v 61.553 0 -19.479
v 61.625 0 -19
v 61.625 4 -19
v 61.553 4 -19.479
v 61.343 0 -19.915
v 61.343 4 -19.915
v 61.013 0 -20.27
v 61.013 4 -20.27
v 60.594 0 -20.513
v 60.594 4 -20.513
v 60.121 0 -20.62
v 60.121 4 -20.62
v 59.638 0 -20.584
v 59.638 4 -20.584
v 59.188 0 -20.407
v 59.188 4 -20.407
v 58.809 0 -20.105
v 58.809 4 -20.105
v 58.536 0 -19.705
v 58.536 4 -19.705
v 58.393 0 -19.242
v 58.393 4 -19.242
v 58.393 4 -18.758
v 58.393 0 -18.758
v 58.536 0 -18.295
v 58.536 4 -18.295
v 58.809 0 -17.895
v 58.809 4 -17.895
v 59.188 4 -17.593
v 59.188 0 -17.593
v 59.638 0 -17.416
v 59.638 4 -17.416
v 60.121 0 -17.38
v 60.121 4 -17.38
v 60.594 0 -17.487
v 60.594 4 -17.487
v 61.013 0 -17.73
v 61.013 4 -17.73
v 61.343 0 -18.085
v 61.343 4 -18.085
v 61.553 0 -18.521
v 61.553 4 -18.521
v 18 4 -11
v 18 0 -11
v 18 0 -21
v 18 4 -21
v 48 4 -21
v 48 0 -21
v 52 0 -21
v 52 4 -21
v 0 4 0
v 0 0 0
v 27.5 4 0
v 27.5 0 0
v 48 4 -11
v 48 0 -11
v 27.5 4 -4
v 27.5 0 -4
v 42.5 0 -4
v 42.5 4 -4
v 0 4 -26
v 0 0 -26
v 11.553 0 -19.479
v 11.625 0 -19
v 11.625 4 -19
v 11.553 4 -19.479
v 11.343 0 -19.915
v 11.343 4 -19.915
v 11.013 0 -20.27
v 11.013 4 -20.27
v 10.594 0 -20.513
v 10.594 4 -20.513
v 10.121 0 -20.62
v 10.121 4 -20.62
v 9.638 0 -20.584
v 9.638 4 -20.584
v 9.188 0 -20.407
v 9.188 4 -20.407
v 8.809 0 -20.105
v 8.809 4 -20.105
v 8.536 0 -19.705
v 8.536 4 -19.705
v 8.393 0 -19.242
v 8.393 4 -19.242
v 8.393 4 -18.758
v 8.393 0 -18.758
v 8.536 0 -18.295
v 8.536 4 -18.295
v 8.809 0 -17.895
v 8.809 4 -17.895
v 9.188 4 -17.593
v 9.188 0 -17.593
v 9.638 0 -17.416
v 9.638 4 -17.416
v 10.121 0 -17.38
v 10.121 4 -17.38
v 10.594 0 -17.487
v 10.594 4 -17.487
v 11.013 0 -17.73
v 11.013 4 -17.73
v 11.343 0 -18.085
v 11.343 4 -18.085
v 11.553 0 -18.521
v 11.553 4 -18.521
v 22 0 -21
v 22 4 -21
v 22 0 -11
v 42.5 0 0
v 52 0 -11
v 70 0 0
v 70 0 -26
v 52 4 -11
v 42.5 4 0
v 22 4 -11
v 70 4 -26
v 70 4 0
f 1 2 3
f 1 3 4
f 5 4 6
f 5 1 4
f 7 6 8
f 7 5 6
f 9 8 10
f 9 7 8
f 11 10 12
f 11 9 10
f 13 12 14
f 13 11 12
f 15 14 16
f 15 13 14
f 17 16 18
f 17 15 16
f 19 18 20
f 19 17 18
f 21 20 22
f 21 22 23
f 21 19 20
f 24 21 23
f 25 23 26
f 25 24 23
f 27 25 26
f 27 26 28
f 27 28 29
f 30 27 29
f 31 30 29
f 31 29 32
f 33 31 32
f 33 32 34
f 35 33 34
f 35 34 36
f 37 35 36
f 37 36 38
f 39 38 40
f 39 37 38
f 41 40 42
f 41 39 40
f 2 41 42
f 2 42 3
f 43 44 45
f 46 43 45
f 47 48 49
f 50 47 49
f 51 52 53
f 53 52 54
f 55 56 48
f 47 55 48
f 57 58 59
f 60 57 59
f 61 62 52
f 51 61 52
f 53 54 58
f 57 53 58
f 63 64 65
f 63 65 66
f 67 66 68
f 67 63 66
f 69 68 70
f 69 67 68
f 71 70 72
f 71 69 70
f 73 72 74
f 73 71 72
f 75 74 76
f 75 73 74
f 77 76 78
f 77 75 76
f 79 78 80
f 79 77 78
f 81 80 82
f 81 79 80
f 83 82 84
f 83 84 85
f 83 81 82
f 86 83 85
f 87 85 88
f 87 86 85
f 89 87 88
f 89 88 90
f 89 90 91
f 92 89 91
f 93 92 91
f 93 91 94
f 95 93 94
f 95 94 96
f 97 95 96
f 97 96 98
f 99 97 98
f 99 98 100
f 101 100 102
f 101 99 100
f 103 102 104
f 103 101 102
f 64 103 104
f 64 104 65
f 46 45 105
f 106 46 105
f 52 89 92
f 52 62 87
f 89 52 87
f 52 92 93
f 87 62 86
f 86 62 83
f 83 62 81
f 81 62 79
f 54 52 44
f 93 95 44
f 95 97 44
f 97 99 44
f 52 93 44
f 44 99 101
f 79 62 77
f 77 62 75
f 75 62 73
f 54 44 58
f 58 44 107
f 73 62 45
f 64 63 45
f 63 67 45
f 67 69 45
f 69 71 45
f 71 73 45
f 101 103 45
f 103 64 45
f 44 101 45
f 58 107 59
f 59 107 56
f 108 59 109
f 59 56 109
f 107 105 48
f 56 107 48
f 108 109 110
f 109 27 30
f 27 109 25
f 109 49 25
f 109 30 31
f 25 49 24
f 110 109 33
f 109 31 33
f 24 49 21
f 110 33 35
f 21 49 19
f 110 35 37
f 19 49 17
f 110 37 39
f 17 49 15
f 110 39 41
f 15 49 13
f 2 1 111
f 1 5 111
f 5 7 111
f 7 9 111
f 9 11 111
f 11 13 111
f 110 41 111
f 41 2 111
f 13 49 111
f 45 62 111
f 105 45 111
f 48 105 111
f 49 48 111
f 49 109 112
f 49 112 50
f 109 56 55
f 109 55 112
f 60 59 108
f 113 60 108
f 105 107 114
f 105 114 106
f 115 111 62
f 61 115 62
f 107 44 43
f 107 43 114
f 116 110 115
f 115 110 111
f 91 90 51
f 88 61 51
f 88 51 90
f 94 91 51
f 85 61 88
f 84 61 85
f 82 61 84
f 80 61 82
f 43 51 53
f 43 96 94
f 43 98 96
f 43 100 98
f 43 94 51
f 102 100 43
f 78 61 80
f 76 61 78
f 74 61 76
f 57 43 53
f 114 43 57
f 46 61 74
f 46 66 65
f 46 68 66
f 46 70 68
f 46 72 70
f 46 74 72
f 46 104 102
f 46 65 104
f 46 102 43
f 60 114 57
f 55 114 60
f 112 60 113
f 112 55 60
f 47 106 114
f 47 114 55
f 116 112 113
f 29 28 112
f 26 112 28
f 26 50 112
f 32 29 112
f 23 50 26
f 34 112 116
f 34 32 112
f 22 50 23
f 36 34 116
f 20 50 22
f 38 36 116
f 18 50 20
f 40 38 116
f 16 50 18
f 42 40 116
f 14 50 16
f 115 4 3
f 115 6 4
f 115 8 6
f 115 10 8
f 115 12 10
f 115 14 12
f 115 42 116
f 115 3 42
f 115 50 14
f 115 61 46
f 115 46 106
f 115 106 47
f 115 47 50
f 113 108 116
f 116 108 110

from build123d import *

# Parameters (mm, degrees)
SKETCH1_R           = 1.625
SKETCH1_W           = 4
SKETCH1_H           = 10
BOSS_EXTRUDE1_DEPTH = 4


with BuildPart() as part:
    # Sketch1 → Boss-Extrude1 (new body)
    with BuildSketch(Plane(origin=(0, 0, 0), x_dir=(1, 0, 0), z_dir=(0, 1, 0))):
        Polygon((0, 0), (20, 0), (27.5, 0), (27.5, 4), (42.5, 4), (42.5, 0), (50, 0), (70, 0), (70, 26), (0, 26), align=None)
        with Locations((10, 19)):
            Circle(SKETCH1_R, mode=Mode.SUBTRACT)
        with Locations((60, 19)):
            Circle(SKETCH1_R, mode=Mode.SUBTRACT)
        with Locations((20, 16)):
            Rectangle(SKETCH1_W, SKETCH1_H, mode=Mode.SUBTRACT)
        with Locations((50, 16)):
            Rectangle(SKETCH1_W, SKETCH1_H, mode=Mode.SUBTRACT)
    extrude(amount=BOSS_EXTRUDE1_DEPTH)


solid = part.part
